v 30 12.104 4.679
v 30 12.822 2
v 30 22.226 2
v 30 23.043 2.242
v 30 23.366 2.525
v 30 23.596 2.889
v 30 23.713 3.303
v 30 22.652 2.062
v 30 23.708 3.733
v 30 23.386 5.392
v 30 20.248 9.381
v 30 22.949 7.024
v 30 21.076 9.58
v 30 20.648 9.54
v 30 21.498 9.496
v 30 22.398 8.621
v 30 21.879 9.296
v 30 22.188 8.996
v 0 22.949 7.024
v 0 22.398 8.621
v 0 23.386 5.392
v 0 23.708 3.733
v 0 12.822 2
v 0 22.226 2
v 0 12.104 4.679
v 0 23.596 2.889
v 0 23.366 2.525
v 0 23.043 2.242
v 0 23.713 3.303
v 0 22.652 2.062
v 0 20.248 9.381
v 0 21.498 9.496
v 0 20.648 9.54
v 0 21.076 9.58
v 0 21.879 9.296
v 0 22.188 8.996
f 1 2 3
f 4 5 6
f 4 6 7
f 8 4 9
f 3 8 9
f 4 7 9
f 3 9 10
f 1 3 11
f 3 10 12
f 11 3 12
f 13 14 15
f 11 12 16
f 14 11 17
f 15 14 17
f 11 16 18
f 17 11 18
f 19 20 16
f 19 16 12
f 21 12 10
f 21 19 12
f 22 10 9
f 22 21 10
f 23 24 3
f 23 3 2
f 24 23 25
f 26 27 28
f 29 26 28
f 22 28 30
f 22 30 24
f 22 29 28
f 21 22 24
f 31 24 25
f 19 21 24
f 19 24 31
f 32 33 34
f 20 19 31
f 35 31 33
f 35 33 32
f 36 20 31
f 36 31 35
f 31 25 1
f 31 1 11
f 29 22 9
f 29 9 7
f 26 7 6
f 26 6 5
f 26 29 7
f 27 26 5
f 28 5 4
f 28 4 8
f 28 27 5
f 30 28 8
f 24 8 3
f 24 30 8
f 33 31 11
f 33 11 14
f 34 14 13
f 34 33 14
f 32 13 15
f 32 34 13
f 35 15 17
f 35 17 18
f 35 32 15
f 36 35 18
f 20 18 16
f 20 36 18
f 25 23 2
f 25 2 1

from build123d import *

# Parameters (mm, degrees)
BOSS_EXTRUDE1_DEPTH = 30


with BuildPart() as part:
    # Sketch3 → Boss-Extrude1 (new body)
    with BuildSketch(Plane(origin=(0, 0, 0), x_dir=(0, 0, -1), z_dir=(1, 0, 0))):
        with BuildLine():
            Line((-2, 22.226110771), (-2, 12.821942467))
            Line((-2, 12.821942467), (-4.678920426, 12.104127903))
            Line((-4.678920426, 12.104127903), (-9.381004578, 20.248376555))
            ThreePointArc((-9.381004578, 20.248376555), (-9.496151336, 21.498457721), (-8.620764237, 22.398268325))
            ThreePointArc((-8.620764237, 22.398268325), (-6.211657082, 23.182219831), (-3.733333333, 23.707851489))
            ThreePointArc((-3.733333333, 23.707851489), (-2.525320566, 23.366286196), (-2, 22.226110771))
        make_face()
    extrude(amount=BOSS_EXTRUDE1_DEPTH)


solid = part.part
